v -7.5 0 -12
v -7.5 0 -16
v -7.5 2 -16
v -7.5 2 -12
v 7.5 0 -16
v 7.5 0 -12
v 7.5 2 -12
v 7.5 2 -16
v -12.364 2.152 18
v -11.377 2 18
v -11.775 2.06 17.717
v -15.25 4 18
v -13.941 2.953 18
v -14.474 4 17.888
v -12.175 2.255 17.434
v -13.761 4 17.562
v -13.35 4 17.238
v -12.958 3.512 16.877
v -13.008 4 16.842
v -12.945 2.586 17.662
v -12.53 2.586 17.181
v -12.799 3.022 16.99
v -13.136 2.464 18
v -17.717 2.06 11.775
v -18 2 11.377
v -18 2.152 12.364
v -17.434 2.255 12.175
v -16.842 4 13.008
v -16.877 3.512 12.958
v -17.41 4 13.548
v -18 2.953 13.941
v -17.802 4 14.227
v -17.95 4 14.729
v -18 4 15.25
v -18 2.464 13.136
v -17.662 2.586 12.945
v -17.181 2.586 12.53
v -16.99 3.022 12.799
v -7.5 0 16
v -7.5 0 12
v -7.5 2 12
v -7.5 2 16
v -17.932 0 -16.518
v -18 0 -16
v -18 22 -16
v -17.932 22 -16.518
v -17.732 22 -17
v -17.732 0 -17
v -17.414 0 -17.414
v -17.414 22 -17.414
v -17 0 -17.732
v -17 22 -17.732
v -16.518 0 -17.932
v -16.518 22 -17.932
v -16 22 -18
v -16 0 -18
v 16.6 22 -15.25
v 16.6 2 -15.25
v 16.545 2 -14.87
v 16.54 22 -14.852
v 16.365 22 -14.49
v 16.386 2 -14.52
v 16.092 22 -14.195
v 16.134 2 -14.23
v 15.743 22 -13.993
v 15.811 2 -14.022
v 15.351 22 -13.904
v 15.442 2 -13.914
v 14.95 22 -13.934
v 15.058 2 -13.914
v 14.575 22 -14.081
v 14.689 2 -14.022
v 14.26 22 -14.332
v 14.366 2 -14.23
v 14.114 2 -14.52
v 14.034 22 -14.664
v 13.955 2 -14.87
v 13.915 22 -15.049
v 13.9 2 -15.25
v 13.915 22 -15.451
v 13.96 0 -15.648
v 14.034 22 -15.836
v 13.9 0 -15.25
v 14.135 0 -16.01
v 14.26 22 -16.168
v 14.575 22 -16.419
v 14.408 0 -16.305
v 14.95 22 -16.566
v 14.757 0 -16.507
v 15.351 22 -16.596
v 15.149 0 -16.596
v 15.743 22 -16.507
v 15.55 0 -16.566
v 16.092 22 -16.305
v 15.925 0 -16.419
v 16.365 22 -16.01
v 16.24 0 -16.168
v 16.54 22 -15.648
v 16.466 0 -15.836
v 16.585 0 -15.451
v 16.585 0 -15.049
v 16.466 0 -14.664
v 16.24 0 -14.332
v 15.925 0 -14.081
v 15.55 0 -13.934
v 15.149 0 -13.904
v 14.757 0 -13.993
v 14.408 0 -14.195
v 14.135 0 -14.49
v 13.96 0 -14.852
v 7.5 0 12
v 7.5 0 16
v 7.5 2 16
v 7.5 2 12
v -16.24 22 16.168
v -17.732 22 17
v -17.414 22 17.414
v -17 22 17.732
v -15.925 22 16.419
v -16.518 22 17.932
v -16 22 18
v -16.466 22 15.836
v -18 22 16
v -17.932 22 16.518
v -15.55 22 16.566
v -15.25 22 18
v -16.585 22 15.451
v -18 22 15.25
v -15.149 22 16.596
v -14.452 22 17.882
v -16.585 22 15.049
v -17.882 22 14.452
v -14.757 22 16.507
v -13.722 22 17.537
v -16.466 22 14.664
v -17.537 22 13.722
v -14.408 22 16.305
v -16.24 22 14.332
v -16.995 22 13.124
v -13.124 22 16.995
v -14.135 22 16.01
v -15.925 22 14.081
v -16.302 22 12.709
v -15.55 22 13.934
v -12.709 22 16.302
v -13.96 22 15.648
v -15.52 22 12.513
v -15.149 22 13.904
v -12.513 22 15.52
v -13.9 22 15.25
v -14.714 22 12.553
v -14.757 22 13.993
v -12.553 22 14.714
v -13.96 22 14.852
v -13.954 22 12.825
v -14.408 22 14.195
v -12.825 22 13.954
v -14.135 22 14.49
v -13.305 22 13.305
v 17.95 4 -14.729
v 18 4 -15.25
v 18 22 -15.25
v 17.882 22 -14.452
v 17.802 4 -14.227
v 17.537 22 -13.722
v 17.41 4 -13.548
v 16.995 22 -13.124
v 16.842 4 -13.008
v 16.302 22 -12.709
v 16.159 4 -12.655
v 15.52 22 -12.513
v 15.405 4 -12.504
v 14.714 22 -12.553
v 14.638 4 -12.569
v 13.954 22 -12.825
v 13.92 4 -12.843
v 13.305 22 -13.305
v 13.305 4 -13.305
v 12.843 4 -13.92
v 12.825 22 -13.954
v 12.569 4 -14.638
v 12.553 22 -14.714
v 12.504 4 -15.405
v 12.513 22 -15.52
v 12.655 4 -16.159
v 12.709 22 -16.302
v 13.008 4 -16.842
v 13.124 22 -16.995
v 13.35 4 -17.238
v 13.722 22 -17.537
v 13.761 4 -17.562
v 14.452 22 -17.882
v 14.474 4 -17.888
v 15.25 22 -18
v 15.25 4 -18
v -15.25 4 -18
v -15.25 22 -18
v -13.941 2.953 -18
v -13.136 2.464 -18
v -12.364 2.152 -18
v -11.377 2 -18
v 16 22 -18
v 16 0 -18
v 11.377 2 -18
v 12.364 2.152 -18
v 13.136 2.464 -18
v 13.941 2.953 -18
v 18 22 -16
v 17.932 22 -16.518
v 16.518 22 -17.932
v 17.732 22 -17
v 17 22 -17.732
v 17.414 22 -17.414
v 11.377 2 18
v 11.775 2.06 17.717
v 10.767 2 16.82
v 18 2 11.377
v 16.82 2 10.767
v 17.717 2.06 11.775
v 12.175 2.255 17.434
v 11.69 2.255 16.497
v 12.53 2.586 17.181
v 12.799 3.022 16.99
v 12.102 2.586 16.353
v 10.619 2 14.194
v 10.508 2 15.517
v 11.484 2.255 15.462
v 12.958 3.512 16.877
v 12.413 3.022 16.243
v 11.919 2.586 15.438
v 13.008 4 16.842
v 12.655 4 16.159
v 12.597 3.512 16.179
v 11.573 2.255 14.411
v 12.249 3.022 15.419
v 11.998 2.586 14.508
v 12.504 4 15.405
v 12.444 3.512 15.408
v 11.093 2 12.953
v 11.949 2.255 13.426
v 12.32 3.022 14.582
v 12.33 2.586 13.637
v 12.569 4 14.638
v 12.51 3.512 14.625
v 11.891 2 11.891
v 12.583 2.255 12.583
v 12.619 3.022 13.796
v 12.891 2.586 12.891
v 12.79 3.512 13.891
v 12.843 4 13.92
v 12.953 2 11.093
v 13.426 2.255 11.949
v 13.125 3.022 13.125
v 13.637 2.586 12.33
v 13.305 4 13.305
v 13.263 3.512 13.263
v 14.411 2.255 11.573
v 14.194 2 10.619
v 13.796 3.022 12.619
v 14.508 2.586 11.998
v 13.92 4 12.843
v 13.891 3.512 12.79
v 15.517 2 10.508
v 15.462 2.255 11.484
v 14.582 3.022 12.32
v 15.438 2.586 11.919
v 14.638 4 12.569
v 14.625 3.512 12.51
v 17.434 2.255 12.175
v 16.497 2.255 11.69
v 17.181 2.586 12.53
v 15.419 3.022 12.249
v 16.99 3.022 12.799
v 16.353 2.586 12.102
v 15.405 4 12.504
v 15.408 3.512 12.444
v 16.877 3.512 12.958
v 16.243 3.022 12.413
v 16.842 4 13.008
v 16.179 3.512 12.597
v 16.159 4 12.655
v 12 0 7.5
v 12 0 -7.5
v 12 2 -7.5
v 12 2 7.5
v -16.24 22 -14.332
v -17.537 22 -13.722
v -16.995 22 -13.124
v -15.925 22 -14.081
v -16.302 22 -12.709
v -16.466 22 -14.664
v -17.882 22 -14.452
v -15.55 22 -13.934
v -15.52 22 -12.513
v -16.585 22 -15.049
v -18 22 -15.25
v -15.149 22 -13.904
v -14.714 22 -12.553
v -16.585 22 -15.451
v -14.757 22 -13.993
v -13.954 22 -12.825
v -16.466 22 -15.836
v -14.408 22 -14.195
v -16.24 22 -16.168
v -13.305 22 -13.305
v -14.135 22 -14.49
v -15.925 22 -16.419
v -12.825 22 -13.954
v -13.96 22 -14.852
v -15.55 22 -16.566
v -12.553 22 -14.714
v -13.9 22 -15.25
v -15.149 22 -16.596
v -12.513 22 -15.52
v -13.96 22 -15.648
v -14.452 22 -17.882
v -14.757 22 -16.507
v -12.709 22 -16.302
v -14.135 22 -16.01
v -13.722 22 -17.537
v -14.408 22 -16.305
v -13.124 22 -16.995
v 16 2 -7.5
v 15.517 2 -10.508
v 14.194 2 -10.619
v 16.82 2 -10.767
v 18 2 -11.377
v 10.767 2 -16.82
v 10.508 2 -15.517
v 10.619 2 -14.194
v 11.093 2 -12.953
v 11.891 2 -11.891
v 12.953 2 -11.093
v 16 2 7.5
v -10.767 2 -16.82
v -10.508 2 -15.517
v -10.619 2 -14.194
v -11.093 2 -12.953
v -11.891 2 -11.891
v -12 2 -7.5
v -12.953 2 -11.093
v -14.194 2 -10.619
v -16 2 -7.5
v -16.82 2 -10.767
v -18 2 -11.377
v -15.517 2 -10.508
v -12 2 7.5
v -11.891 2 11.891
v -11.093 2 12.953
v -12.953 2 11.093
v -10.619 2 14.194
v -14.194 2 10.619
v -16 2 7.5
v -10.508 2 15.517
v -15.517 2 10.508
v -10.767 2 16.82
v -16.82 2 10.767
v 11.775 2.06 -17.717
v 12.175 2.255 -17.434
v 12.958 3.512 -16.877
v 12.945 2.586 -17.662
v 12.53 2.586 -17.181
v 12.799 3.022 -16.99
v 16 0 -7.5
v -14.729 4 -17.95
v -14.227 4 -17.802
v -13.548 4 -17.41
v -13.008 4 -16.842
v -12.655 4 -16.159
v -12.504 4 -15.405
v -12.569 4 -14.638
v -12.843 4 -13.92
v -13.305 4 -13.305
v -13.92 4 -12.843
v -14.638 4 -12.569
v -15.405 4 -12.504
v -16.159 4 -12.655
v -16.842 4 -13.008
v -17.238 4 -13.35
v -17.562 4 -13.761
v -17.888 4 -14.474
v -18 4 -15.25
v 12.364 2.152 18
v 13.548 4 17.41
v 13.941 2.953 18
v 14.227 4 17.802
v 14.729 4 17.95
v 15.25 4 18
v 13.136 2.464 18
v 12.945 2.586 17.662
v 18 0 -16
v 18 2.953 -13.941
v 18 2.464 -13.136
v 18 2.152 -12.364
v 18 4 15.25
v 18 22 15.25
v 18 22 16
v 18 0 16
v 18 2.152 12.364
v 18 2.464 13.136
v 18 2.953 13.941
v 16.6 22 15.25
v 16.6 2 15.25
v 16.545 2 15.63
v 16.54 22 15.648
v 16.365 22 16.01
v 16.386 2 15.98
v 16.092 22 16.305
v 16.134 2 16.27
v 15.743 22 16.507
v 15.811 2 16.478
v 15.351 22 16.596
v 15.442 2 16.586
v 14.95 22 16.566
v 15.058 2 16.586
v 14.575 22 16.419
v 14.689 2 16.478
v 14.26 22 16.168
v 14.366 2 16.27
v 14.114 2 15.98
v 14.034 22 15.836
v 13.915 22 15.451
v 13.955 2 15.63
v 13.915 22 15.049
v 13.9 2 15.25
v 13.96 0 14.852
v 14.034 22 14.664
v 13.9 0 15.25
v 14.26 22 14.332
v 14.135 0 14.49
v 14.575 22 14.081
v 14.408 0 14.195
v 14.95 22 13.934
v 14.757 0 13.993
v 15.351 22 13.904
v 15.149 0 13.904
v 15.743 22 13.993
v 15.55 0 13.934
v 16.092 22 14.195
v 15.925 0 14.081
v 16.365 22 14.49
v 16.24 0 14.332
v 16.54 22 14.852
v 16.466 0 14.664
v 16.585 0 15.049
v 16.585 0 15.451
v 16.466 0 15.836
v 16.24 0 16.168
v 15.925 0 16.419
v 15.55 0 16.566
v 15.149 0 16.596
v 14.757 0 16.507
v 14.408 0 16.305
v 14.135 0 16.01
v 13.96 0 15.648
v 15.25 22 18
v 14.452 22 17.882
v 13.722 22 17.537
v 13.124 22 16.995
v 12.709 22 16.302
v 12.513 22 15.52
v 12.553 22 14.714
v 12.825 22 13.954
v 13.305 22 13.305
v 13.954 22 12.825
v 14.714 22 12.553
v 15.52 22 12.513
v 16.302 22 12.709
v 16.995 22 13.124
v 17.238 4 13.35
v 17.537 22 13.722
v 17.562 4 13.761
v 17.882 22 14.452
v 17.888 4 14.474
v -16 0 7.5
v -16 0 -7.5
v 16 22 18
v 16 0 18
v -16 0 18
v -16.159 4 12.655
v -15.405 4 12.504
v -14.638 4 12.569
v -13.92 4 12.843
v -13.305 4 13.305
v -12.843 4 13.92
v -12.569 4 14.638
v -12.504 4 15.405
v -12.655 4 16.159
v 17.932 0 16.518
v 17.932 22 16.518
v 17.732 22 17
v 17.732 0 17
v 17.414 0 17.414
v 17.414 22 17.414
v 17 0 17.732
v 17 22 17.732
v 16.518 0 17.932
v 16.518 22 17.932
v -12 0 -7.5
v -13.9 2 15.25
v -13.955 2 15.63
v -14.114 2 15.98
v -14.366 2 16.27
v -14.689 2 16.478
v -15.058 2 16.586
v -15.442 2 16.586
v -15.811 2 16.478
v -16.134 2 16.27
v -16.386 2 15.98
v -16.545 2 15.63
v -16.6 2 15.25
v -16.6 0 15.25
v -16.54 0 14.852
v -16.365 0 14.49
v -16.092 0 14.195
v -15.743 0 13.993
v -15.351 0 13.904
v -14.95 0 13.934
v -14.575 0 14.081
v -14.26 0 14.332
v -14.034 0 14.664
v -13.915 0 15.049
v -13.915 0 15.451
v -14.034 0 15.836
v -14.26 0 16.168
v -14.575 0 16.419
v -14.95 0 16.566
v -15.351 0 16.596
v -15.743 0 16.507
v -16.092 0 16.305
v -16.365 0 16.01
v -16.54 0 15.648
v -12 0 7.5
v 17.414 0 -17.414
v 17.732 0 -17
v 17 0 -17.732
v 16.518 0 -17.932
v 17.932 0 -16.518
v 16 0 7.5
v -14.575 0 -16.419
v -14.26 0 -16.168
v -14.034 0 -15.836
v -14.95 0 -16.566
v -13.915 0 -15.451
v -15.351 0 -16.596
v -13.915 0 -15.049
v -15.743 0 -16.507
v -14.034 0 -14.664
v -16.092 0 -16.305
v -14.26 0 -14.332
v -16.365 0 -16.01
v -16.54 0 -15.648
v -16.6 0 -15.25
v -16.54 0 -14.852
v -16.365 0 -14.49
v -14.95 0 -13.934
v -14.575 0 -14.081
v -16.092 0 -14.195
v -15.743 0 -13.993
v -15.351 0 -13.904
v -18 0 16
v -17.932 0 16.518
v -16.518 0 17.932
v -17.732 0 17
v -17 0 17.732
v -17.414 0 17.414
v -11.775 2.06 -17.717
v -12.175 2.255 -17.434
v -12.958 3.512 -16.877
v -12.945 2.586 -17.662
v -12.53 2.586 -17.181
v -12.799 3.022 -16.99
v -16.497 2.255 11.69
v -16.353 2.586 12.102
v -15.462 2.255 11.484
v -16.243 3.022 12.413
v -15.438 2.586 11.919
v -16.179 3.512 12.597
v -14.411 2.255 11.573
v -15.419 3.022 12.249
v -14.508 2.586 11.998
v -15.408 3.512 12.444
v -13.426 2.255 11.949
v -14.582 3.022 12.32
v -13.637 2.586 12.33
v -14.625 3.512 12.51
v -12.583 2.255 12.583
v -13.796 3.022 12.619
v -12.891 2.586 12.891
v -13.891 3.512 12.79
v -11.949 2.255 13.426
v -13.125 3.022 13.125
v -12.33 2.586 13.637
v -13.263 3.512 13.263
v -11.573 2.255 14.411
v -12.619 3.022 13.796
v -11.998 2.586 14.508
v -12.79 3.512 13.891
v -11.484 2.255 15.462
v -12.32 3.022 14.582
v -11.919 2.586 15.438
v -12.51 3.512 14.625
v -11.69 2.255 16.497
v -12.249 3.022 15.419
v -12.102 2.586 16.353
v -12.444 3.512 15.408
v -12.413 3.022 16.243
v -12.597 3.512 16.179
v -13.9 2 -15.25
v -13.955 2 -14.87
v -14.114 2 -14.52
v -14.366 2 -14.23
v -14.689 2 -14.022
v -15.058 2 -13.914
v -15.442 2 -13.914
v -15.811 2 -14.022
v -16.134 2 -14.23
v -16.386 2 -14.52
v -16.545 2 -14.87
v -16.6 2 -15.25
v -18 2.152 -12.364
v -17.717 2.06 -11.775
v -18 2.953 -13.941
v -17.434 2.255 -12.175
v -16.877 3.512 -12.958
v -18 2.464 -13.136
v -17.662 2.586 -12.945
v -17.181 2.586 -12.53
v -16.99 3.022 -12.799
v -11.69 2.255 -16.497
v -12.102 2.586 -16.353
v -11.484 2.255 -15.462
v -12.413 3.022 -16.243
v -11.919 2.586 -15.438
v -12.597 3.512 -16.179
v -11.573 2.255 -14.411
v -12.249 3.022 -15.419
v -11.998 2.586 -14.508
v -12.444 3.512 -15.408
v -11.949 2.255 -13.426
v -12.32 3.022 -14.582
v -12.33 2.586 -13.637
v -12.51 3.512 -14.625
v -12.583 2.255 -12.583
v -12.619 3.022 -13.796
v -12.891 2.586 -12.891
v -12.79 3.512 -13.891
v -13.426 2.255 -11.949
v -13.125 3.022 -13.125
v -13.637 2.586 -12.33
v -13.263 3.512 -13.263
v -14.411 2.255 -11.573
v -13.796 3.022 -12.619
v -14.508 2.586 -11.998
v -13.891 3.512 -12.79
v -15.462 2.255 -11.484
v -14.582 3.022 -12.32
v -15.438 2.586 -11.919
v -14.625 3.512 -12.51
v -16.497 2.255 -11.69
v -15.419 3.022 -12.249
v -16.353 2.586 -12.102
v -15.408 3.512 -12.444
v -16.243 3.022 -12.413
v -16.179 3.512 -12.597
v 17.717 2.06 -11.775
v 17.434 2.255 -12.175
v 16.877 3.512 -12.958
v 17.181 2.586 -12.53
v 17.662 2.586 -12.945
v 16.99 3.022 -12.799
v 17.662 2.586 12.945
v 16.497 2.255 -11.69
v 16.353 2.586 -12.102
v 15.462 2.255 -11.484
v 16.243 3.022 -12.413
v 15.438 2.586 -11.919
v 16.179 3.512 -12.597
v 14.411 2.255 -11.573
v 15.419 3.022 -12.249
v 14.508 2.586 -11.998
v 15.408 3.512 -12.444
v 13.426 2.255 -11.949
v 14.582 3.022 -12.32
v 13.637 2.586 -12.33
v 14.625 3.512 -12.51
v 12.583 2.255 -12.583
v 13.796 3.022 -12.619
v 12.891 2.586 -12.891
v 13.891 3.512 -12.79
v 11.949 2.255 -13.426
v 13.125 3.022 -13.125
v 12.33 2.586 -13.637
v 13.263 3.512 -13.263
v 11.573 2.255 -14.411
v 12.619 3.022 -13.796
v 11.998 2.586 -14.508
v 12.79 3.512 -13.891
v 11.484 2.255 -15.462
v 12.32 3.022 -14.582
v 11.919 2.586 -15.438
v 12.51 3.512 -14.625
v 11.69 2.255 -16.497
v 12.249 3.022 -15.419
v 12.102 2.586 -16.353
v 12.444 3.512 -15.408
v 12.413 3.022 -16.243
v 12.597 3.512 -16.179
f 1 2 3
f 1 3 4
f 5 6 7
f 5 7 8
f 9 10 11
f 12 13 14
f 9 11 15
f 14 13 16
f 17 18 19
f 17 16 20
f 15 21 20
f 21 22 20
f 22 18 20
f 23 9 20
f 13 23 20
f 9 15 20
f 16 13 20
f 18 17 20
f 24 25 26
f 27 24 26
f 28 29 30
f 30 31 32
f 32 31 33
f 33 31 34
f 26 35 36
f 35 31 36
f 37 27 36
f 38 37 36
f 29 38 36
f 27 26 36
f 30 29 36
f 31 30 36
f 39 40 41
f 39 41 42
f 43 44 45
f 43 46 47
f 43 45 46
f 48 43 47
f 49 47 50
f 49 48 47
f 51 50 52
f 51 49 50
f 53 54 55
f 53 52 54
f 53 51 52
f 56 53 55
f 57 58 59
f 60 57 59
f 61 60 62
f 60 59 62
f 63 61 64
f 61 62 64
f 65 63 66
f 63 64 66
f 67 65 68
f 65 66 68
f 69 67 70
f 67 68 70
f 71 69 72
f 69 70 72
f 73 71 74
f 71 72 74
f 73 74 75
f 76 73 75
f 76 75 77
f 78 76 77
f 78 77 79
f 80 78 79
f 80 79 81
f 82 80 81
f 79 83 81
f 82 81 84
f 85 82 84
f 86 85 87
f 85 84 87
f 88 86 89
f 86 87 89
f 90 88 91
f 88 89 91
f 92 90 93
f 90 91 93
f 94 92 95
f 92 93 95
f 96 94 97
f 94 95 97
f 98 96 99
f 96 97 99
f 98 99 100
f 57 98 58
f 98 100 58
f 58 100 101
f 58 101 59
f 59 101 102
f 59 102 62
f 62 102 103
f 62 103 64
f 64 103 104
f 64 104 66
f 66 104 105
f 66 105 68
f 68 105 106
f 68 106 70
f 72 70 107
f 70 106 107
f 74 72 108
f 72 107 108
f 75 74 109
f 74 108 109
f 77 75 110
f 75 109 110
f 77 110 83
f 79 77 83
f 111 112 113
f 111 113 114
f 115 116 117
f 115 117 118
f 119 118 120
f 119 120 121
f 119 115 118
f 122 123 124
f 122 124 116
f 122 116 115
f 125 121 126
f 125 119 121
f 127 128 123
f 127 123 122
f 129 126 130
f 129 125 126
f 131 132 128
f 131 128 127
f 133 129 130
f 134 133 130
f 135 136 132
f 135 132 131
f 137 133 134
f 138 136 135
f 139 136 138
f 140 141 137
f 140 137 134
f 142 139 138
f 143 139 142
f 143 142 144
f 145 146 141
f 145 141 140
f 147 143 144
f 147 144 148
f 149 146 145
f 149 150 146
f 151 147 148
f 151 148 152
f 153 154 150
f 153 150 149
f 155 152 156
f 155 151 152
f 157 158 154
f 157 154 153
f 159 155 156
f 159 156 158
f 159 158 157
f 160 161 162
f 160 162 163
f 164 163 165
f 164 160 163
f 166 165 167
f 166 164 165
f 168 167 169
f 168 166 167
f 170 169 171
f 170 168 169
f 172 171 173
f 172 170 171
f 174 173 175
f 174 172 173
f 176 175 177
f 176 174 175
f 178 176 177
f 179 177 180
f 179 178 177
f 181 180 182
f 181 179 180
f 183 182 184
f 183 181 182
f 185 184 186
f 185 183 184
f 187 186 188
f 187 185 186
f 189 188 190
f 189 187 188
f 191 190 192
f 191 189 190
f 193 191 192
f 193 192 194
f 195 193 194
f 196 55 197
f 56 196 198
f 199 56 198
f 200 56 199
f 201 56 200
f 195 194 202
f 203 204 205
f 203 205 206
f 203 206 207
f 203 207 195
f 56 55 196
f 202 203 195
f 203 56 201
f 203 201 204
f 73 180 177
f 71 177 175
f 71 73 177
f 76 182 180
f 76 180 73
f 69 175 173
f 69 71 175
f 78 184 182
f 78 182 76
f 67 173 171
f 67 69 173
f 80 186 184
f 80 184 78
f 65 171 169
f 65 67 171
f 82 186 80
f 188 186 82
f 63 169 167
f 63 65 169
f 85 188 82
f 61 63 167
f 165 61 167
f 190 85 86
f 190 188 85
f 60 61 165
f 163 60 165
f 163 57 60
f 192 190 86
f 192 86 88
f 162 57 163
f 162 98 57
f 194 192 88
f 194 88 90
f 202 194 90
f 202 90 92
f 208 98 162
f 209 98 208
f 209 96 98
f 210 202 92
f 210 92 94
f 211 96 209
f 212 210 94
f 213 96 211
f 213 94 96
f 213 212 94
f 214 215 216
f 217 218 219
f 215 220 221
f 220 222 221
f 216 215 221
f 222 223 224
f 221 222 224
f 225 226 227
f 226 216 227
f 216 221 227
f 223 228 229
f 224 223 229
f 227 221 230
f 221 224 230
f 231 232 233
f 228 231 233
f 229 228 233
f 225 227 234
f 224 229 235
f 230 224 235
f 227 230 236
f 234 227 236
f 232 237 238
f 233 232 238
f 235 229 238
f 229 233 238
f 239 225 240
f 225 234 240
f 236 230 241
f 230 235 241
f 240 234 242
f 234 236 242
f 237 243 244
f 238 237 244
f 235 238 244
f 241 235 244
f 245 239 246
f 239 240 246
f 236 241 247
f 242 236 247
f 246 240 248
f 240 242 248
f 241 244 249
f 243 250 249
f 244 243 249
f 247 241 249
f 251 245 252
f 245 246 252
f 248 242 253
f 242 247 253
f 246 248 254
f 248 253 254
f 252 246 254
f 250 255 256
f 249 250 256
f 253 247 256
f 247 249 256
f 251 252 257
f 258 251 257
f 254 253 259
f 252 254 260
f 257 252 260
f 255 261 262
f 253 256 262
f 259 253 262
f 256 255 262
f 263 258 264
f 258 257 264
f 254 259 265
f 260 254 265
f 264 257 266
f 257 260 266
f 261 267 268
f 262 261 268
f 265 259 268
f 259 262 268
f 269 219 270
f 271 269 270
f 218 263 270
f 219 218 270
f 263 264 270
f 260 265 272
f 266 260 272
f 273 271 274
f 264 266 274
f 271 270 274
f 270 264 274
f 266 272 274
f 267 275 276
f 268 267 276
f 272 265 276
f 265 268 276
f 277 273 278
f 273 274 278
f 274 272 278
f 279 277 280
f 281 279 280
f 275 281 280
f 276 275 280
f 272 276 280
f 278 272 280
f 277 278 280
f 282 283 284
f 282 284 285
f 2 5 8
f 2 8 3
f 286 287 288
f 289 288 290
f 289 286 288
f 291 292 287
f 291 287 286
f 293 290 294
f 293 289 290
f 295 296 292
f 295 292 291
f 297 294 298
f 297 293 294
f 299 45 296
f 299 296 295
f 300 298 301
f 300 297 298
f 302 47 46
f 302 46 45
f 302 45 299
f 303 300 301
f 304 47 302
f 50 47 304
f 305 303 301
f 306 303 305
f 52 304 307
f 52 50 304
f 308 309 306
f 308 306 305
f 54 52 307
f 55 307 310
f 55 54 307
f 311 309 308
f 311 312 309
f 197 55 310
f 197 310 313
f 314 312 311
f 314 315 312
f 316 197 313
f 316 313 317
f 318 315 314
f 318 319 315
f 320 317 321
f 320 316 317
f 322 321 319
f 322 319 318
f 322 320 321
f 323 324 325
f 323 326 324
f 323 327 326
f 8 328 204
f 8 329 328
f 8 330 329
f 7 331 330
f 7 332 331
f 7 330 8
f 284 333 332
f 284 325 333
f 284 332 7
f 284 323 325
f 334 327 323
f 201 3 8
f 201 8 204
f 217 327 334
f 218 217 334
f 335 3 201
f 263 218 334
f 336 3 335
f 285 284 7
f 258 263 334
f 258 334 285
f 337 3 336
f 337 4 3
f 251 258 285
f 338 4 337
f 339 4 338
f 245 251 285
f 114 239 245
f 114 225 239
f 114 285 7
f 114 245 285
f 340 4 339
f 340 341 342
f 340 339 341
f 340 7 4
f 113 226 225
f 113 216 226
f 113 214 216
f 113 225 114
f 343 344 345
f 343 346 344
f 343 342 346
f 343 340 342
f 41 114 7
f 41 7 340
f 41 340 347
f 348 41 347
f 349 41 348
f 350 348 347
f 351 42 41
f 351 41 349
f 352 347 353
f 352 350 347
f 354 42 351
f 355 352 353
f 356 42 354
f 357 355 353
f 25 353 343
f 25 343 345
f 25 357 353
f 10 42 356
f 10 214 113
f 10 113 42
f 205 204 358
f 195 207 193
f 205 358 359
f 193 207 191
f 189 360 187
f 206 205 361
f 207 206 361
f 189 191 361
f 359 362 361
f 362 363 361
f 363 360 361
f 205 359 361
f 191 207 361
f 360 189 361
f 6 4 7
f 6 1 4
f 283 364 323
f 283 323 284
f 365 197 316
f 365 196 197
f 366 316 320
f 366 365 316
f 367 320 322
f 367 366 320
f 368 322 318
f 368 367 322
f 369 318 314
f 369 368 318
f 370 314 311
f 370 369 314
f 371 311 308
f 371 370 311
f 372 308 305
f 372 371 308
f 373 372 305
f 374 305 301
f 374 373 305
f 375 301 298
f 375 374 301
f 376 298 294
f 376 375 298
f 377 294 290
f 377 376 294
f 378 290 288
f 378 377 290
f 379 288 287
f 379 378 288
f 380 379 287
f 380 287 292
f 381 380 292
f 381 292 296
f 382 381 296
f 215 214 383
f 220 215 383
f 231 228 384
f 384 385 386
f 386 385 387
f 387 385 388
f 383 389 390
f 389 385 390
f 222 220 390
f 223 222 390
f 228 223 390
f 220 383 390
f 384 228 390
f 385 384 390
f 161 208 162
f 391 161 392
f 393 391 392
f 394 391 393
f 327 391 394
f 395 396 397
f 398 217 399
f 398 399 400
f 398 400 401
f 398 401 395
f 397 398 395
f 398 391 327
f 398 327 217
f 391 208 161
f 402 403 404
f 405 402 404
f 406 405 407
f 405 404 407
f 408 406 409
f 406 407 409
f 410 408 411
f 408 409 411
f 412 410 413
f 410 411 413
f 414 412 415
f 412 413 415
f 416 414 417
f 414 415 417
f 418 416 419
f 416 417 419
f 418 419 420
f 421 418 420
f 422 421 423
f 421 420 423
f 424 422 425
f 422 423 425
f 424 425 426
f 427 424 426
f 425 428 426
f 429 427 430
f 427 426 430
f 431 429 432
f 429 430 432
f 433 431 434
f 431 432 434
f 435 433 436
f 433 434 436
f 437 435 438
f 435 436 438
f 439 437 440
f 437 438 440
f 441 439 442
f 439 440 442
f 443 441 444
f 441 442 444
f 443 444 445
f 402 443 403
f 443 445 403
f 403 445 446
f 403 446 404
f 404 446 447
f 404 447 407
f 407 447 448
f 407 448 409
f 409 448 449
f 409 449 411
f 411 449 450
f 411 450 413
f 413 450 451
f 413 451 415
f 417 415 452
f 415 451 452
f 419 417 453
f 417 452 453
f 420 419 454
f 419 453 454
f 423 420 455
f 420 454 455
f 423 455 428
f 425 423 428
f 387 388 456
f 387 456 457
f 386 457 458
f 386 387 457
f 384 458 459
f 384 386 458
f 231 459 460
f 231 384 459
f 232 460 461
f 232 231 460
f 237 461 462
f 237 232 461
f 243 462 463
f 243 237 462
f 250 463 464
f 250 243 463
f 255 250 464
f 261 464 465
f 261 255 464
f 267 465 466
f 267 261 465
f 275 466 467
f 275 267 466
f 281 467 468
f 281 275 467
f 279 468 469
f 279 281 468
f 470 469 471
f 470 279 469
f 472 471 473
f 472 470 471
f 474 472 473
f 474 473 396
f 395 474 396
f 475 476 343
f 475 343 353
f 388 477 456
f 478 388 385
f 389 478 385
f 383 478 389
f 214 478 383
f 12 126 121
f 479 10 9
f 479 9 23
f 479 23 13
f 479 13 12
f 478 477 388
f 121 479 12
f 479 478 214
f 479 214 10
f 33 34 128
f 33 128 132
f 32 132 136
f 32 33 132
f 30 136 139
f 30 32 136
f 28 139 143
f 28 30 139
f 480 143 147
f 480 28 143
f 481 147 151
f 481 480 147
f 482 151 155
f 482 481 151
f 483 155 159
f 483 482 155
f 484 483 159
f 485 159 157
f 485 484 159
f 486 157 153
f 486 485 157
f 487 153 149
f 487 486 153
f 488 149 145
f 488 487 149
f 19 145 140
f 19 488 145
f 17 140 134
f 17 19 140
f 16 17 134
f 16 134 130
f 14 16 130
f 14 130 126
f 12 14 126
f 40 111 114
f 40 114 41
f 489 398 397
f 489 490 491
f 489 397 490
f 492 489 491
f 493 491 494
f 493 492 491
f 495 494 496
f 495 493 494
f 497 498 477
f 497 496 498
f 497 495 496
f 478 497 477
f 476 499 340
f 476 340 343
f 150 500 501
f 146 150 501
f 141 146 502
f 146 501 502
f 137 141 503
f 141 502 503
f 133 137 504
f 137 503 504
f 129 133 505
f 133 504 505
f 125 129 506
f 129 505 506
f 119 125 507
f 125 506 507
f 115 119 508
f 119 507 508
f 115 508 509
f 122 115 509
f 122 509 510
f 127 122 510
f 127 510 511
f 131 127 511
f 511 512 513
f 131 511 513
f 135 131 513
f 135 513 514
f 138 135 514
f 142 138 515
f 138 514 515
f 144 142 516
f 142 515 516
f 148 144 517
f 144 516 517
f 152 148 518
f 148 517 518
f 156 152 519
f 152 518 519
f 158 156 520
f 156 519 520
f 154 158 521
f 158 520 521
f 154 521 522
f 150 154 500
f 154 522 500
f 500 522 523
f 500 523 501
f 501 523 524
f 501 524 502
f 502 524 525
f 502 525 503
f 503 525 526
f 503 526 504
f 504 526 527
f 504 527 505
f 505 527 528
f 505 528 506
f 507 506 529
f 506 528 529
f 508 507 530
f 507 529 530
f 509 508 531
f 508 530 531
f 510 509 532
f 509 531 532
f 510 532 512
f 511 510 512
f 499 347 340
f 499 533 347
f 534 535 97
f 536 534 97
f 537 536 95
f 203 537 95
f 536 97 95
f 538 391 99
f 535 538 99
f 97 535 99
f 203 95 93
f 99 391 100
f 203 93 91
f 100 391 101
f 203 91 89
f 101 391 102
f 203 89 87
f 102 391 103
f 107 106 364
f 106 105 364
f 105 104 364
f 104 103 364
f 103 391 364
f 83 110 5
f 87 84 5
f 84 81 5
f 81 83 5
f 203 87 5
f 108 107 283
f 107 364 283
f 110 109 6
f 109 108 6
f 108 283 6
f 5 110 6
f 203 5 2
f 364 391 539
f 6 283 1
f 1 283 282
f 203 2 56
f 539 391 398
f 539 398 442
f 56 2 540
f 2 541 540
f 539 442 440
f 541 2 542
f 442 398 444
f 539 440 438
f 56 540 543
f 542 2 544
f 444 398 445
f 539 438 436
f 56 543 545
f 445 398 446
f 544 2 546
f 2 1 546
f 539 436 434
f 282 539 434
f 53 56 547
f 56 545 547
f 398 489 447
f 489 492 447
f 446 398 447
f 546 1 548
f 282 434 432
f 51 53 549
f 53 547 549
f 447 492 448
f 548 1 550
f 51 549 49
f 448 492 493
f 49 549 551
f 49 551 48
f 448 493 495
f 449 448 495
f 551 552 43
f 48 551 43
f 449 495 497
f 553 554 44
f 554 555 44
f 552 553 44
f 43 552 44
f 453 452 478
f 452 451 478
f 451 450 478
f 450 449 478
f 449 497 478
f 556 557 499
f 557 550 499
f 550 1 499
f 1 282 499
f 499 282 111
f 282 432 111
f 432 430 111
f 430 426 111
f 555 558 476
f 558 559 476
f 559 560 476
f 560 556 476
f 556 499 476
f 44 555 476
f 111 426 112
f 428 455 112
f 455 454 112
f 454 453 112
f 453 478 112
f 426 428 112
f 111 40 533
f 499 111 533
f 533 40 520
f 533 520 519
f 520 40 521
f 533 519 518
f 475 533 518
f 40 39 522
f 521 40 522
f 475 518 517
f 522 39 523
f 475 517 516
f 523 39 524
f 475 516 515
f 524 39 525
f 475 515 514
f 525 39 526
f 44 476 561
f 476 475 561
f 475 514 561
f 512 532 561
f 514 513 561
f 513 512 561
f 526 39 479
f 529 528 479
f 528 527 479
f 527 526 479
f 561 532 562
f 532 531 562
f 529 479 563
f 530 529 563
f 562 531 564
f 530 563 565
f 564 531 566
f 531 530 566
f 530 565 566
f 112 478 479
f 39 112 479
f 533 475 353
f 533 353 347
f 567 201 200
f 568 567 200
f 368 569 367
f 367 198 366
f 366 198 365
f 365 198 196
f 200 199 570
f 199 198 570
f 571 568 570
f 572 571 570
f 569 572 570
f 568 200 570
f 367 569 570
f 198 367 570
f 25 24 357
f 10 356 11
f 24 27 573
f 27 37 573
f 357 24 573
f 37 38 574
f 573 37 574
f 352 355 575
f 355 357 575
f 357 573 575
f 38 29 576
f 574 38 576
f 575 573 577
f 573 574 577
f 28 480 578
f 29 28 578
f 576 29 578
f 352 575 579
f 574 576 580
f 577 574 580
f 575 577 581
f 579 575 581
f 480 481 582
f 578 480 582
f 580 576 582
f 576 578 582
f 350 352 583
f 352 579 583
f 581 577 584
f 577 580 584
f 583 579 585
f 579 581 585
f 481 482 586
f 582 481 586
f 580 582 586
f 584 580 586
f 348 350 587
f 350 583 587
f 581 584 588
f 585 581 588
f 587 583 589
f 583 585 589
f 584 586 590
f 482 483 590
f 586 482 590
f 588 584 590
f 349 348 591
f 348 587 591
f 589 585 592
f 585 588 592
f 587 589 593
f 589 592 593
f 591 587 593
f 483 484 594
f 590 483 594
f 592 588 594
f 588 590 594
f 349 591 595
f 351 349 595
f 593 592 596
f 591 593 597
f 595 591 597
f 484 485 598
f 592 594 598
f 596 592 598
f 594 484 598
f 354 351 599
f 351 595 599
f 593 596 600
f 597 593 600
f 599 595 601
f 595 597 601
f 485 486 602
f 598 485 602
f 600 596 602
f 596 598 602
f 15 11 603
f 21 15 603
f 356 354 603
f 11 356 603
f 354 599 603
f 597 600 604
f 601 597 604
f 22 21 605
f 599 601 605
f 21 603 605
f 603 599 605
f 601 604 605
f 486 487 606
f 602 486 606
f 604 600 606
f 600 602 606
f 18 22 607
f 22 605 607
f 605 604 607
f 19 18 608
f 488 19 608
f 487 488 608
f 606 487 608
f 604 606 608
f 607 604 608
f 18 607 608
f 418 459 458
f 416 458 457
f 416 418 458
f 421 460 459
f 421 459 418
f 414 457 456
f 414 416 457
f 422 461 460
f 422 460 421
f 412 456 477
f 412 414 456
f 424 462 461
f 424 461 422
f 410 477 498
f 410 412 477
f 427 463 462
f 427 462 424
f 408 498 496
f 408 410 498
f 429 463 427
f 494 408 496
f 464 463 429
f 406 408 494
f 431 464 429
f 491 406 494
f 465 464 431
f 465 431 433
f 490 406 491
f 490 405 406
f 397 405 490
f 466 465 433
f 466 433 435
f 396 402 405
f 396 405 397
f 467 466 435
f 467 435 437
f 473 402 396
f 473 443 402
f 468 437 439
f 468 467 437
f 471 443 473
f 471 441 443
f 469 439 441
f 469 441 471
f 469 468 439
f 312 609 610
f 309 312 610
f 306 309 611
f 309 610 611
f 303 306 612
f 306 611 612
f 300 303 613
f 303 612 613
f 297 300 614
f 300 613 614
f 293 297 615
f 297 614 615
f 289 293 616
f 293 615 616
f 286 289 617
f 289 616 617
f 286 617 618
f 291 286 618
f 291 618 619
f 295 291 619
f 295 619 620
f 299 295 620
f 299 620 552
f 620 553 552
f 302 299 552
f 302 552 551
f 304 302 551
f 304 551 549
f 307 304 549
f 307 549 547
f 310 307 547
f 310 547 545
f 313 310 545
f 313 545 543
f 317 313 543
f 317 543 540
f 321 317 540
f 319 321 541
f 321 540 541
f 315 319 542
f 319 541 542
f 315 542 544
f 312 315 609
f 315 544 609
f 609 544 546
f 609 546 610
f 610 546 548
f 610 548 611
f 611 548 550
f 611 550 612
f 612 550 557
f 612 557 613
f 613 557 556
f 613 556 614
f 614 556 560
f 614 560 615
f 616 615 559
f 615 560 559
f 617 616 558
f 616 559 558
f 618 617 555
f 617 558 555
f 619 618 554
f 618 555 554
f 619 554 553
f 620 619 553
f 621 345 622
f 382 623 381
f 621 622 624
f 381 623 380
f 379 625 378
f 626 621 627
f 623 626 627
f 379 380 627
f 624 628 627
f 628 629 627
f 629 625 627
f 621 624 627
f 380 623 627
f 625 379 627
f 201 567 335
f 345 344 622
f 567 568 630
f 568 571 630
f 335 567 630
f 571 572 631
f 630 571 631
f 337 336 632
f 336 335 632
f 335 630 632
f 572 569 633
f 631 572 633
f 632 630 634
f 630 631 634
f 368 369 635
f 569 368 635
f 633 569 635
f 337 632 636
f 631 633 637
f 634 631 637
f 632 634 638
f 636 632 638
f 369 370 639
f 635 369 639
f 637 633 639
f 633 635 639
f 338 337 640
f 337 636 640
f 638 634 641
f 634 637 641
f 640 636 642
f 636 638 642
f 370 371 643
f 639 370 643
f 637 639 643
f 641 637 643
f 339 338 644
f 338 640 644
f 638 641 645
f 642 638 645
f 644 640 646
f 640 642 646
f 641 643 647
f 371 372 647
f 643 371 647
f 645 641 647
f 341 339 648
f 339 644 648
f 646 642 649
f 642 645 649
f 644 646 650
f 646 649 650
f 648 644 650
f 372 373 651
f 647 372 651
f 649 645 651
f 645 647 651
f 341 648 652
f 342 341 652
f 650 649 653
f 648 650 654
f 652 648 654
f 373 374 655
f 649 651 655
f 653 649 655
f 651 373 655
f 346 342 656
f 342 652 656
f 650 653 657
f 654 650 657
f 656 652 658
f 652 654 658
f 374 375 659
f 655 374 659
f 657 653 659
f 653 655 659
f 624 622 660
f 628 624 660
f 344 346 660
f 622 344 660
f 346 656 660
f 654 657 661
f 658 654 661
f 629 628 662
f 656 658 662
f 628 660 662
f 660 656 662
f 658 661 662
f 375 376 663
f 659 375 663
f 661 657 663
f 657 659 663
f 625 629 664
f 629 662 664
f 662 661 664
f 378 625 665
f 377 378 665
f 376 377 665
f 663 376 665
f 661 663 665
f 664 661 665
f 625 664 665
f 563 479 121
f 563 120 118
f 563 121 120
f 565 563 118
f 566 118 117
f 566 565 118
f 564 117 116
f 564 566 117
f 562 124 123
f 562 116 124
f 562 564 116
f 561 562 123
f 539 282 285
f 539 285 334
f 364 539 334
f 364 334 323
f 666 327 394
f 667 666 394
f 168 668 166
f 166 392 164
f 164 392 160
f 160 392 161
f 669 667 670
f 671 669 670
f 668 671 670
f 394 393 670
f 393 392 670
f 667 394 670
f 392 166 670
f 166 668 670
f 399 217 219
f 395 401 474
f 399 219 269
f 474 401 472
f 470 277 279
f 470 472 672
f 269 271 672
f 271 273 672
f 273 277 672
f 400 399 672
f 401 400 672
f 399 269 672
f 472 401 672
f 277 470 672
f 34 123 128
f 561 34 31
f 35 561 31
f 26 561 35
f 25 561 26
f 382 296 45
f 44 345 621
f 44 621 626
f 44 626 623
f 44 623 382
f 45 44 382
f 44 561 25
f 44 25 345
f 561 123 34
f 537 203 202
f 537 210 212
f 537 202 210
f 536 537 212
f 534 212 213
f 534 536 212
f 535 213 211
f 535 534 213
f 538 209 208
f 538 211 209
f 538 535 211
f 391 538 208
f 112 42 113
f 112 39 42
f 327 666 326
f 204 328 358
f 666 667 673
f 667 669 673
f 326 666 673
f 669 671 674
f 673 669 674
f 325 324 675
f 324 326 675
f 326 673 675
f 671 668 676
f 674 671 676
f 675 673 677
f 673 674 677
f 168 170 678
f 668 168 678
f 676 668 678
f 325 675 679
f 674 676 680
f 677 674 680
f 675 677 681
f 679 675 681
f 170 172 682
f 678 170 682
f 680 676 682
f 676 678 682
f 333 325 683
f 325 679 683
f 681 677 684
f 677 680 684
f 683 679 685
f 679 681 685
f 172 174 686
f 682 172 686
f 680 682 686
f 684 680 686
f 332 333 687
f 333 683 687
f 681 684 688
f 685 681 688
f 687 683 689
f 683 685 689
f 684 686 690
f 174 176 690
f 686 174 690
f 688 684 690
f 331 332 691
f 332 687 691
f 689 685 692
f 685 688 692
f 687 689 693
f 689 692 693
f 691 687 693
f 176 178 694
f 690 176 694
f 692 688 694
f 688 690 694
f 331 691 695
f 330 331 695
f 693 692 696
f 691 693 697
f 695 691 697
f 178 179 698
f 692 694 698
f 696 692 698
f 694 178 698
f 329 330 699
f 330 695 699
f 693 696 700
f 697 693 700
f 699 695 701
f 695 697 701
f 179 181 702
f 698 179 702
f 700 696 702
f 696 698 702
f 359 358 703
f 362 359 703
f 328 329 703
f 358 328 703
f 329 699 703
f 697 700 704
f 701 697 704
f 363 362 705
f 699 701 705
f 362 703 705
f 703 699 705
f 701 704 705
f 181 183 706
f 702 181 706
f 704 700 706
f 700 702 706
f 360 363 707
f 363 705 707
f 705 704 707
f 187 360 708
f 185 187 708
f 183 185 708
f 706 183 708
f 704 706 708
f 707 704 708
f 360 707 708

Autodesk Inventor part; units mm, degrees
ref_plane "YZ Plane" through (0, 0, 0) normal (1, 0, 0) x (0, 1, 0)
ref_plane "XZ Plane" through (0, 0, 0) normal (0, 1, 0) x (-1, 0, 0)
ref_plane "XY Plane" through (0, 0, 0) normal (0, 0, 1) x (1, 0, 0)
sketch "Sketch1" plane through (0, 0, 0) normal (0, 1, 0) x (-1, 0, 0)
  line L0 (16, -18) -> (-16, -18)
  line L1 (-18, -16) -> (-18, 16)
  line L2 (-16, 18) -> (16, 18)
  line L3 (18, 16) -> (18, -16)
  line L4 (18, -18) -> (-18, 18)
  circle A0 centre (-15.25, -15.25) radius 1.35
  line L5 (0, -18) -> (0, 18)
  line L6 (18, 0) -> (-18, 0)
  circle A1 centre (-15.25, 15.25) radius 1.35
  circle A2 centre (15.25, -15.25) radius 1.35
  circle A3 centre (15.25, 15.25) radius 1.35
  arc A4 (16, -18) -> (18, -16) centre (16, -16) ccw
  arc A5 (-18, -16) -> (-16, -18) centre (-16, -16) ccw
  arc A6 (-16, 18) -> (-18, 16) centre (-16, 16) ccw
  arc A7 (18, 16) -> (16, 18) centre (16, 16) ccw
  point P0 (0, 0)
  point P1 (-18, -18)
  point P2 (18, 18)
  point P3 (0, 0)
  dimension "d0" = 36
  dimension "d1" = 36
  dimension "d4" = 2.7
  dimension "d5" = 30.5
  dimension "d6" = 30.5
  dimension "d7" = 2
extrude "Extrusion1" add sketch "Sketch1" along normal blind 2 contours L0 L5 L4 A2 A4 | L0 A5 L1 L6 L5 | L4 A2 L6 L3 A4 | L6 L1 A6 L4 A1 | L4 A1 A6 L2 L5 | L5 L2 A7 L3 L6
sketch "Sketch2" plane through (0, 2, 0) normal (0, 1, 0) x (1, 0, 0)
  circle A0 centre (-15.25, 15.25) radius 1.35 projected
  circle A1 centre (15.25, 15.25) radius 1.35 projected
  circle A2 centre (-15.25, -15.25) radius 1.35 projected
  circle A3 centre (15.25, -15.25) radius 1.35 projected
  circle A4 centre (-15.25, 15.25) radius 2.75
  line L0 (16, 18) -> (-16, 18) projected
  line L1 (0, 18) -> (0, -18)
  line L2 (-16, -18) -> (16, -18) projected
  line L3 (18, -16) -> (18, 16) projected
  line L4 (18, 0) -> (-18, 0)
  line L5 (-18, 16) -> (-18, -16) projected
  arc A5 (-16, 18) -> (-18, 16) centre (-16, 16) ccw projected
  line L6 (-16, -18) -> (16, -18) projected
  arc A6 (16, -18) -> (18, -16) centre (16, -16) ccw projected
  line L7 (18, -16) -> (18, 16) projected
  arc A7 (18, 16) -> (16, 18) centre (16, 16) ccw projected
  line L8 (16, 18) -> (-16, 18) projected
  arc A8 (-16, 18) -> (-18, 16) centre (-16, 16) ccw projected
  line L9 (-18, 16) -> (-18, -16) projected
  arc A9 (-18, -16) -> (-16, -18) centre (-16, -16) ccw projected
  circle A10 centre (15.25, 15.25) radius 1.35 projected
  circle A11 centre (-15.25, 15.25) radius 1.35 projected
  circle A12 centre (-15.25, -15.25) radius 1.35 projected
  circle A13 centre (15.25, -15.25) radius 1.35 projected
  circle A14 centre (15.25, 15.25) radius 2.75
  circle A15 centre (-15.25, -15.25) radius 2.75
  circle A16 centre (15.25, -15.25) radius 2.75
  point P0 (0, 0)
  point P1 (18, -15.25)
  point P2 (15.25, -18)
  point P3 (-15.25, -18)
  point P4 (-18, -15.25)
  point P5 (-18, -16)
  point P6 (15.25, 18)
  point P7 (18, 15.25)
  point P8 (-15.25, 18)
  point P9 (-18, 15.25)
extrude "Extrusion2" add sketch "Sketch2" along normal blind 20 contours A4 | A4 L5 A5 L0 | L0 A7 L3 A14 | A14 | A15 L2 A9 L5 | A15 | A16 L3 A6 L2 | A16
fillet "Fillet1" radius 2 4 edges at (-13.3055, 2, 13.3055) (13.3055, 2, 13.3055) (13.3055, 2, -13.3055) (-13.3055, 2, -13.3055)
sketch "Sketch3" plane through (0, 0, 0) normal (0, -1, 0) x (1, 0, 0)
  line L0 (-7.5, 16) -> (7.5, 16)
  line L1 (7.5, 16) -> (7.5, 12)
  line L2 (7.5, 12) -> (-7.5, 12)
  line L3 (-7.5, 12) -> (-7.5, 16)
  line L4 (-7.5, 12) -> (7.5, 16)
  line L5 (-16, 18) -> (16, 18) projected
  line L6 (0, 18) -> (0, -18)
  line L7 (11.377, -18) -> (-11.377, -18) projected
  line L8 (16, 7.5) -> (16, -7.5)
  line L9 (12, 7.5) -> (16, 7.5)
  line L10 (12, -7.5) -> (12, 7.5)
  line L11 (16, -7.5) -> (12, -7.5)
  line L12 (7.5, -16) -> (-7.5, -16)
  line L13 (7.5, -12) -> (7.5, -16)
  line L14 (-7.5, -12) -> (7.5, -12)
  line L15 (-7.5, -16) -> (-7.5, -12)
  line L16 (-16, -7.5) -> (-16, 7.5)
  line L17 (-12, -7.5) -> (-16, -7.5)
  line L18 (-12, 7.5) -> (-12, -7.5)
  line L19 (-16, 7.5) -> (-12, 7.5)
  point P0 (0, 0)
  point P1 (0, 14)
  point P2 (0, -12)
  point P3 (0, -16)
  dimension "d11" = 4
  dimension "d12" = 4
  dimension "d13" = 15
  dimension "d16" = 360
extrude "Extrusion3" cut sketch "Sketch3" against normal through all
properties part number "v3_gps_stand"
